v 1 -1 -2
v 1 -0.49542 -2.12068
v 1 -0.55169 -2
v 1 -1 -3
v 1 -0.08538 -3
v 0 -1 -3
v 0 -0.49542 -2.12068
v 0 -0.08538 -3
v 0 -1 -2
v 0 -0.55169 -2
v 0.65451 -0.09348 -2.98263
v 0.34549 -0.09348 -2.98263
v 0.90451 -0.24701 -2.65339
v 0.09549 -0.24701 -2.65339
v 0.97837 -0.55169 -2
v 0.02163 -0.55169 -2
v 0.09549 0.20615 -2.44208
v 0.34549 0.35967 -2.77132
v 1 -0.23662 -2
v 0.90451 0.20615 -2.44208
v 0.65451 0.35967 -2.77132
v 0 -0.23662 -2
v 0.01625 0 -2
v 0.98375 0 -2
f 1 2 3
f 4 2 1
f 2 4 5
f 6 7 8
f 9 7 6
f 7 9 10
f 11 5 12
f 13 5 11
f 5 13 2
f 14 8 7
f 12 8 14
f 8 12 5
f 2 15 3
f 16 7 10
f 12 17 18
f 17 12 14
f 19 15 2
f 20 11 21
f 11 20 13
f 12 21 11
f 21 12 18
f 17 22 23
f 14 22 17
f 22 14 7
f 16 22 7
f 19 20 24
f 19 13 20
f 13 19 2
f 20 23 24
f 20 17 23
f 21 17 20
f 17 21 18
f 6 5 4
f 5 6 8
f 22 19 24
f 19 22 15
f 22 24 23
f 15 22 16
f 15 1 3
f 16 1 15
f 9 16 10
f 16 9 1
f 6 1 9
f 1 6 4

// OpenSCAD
		 translate ([0,0,-1])rotate([-180, 0, 0]) translate ([0,0,1]){
			 
             
		 intersection(){translate([0,-1,0])cube([3,2,1]);
             rotate([25,0,0])
    union(){
    color([1,0,0])translate([0,0.5,-1])cube([1,2,3]);
   translate([0.5,0,-0.10])scale([1,1,2])rotate([-90,0,0])cylinder(2,0.5,0.5,$fn=10);
    }
    }
             
             }
